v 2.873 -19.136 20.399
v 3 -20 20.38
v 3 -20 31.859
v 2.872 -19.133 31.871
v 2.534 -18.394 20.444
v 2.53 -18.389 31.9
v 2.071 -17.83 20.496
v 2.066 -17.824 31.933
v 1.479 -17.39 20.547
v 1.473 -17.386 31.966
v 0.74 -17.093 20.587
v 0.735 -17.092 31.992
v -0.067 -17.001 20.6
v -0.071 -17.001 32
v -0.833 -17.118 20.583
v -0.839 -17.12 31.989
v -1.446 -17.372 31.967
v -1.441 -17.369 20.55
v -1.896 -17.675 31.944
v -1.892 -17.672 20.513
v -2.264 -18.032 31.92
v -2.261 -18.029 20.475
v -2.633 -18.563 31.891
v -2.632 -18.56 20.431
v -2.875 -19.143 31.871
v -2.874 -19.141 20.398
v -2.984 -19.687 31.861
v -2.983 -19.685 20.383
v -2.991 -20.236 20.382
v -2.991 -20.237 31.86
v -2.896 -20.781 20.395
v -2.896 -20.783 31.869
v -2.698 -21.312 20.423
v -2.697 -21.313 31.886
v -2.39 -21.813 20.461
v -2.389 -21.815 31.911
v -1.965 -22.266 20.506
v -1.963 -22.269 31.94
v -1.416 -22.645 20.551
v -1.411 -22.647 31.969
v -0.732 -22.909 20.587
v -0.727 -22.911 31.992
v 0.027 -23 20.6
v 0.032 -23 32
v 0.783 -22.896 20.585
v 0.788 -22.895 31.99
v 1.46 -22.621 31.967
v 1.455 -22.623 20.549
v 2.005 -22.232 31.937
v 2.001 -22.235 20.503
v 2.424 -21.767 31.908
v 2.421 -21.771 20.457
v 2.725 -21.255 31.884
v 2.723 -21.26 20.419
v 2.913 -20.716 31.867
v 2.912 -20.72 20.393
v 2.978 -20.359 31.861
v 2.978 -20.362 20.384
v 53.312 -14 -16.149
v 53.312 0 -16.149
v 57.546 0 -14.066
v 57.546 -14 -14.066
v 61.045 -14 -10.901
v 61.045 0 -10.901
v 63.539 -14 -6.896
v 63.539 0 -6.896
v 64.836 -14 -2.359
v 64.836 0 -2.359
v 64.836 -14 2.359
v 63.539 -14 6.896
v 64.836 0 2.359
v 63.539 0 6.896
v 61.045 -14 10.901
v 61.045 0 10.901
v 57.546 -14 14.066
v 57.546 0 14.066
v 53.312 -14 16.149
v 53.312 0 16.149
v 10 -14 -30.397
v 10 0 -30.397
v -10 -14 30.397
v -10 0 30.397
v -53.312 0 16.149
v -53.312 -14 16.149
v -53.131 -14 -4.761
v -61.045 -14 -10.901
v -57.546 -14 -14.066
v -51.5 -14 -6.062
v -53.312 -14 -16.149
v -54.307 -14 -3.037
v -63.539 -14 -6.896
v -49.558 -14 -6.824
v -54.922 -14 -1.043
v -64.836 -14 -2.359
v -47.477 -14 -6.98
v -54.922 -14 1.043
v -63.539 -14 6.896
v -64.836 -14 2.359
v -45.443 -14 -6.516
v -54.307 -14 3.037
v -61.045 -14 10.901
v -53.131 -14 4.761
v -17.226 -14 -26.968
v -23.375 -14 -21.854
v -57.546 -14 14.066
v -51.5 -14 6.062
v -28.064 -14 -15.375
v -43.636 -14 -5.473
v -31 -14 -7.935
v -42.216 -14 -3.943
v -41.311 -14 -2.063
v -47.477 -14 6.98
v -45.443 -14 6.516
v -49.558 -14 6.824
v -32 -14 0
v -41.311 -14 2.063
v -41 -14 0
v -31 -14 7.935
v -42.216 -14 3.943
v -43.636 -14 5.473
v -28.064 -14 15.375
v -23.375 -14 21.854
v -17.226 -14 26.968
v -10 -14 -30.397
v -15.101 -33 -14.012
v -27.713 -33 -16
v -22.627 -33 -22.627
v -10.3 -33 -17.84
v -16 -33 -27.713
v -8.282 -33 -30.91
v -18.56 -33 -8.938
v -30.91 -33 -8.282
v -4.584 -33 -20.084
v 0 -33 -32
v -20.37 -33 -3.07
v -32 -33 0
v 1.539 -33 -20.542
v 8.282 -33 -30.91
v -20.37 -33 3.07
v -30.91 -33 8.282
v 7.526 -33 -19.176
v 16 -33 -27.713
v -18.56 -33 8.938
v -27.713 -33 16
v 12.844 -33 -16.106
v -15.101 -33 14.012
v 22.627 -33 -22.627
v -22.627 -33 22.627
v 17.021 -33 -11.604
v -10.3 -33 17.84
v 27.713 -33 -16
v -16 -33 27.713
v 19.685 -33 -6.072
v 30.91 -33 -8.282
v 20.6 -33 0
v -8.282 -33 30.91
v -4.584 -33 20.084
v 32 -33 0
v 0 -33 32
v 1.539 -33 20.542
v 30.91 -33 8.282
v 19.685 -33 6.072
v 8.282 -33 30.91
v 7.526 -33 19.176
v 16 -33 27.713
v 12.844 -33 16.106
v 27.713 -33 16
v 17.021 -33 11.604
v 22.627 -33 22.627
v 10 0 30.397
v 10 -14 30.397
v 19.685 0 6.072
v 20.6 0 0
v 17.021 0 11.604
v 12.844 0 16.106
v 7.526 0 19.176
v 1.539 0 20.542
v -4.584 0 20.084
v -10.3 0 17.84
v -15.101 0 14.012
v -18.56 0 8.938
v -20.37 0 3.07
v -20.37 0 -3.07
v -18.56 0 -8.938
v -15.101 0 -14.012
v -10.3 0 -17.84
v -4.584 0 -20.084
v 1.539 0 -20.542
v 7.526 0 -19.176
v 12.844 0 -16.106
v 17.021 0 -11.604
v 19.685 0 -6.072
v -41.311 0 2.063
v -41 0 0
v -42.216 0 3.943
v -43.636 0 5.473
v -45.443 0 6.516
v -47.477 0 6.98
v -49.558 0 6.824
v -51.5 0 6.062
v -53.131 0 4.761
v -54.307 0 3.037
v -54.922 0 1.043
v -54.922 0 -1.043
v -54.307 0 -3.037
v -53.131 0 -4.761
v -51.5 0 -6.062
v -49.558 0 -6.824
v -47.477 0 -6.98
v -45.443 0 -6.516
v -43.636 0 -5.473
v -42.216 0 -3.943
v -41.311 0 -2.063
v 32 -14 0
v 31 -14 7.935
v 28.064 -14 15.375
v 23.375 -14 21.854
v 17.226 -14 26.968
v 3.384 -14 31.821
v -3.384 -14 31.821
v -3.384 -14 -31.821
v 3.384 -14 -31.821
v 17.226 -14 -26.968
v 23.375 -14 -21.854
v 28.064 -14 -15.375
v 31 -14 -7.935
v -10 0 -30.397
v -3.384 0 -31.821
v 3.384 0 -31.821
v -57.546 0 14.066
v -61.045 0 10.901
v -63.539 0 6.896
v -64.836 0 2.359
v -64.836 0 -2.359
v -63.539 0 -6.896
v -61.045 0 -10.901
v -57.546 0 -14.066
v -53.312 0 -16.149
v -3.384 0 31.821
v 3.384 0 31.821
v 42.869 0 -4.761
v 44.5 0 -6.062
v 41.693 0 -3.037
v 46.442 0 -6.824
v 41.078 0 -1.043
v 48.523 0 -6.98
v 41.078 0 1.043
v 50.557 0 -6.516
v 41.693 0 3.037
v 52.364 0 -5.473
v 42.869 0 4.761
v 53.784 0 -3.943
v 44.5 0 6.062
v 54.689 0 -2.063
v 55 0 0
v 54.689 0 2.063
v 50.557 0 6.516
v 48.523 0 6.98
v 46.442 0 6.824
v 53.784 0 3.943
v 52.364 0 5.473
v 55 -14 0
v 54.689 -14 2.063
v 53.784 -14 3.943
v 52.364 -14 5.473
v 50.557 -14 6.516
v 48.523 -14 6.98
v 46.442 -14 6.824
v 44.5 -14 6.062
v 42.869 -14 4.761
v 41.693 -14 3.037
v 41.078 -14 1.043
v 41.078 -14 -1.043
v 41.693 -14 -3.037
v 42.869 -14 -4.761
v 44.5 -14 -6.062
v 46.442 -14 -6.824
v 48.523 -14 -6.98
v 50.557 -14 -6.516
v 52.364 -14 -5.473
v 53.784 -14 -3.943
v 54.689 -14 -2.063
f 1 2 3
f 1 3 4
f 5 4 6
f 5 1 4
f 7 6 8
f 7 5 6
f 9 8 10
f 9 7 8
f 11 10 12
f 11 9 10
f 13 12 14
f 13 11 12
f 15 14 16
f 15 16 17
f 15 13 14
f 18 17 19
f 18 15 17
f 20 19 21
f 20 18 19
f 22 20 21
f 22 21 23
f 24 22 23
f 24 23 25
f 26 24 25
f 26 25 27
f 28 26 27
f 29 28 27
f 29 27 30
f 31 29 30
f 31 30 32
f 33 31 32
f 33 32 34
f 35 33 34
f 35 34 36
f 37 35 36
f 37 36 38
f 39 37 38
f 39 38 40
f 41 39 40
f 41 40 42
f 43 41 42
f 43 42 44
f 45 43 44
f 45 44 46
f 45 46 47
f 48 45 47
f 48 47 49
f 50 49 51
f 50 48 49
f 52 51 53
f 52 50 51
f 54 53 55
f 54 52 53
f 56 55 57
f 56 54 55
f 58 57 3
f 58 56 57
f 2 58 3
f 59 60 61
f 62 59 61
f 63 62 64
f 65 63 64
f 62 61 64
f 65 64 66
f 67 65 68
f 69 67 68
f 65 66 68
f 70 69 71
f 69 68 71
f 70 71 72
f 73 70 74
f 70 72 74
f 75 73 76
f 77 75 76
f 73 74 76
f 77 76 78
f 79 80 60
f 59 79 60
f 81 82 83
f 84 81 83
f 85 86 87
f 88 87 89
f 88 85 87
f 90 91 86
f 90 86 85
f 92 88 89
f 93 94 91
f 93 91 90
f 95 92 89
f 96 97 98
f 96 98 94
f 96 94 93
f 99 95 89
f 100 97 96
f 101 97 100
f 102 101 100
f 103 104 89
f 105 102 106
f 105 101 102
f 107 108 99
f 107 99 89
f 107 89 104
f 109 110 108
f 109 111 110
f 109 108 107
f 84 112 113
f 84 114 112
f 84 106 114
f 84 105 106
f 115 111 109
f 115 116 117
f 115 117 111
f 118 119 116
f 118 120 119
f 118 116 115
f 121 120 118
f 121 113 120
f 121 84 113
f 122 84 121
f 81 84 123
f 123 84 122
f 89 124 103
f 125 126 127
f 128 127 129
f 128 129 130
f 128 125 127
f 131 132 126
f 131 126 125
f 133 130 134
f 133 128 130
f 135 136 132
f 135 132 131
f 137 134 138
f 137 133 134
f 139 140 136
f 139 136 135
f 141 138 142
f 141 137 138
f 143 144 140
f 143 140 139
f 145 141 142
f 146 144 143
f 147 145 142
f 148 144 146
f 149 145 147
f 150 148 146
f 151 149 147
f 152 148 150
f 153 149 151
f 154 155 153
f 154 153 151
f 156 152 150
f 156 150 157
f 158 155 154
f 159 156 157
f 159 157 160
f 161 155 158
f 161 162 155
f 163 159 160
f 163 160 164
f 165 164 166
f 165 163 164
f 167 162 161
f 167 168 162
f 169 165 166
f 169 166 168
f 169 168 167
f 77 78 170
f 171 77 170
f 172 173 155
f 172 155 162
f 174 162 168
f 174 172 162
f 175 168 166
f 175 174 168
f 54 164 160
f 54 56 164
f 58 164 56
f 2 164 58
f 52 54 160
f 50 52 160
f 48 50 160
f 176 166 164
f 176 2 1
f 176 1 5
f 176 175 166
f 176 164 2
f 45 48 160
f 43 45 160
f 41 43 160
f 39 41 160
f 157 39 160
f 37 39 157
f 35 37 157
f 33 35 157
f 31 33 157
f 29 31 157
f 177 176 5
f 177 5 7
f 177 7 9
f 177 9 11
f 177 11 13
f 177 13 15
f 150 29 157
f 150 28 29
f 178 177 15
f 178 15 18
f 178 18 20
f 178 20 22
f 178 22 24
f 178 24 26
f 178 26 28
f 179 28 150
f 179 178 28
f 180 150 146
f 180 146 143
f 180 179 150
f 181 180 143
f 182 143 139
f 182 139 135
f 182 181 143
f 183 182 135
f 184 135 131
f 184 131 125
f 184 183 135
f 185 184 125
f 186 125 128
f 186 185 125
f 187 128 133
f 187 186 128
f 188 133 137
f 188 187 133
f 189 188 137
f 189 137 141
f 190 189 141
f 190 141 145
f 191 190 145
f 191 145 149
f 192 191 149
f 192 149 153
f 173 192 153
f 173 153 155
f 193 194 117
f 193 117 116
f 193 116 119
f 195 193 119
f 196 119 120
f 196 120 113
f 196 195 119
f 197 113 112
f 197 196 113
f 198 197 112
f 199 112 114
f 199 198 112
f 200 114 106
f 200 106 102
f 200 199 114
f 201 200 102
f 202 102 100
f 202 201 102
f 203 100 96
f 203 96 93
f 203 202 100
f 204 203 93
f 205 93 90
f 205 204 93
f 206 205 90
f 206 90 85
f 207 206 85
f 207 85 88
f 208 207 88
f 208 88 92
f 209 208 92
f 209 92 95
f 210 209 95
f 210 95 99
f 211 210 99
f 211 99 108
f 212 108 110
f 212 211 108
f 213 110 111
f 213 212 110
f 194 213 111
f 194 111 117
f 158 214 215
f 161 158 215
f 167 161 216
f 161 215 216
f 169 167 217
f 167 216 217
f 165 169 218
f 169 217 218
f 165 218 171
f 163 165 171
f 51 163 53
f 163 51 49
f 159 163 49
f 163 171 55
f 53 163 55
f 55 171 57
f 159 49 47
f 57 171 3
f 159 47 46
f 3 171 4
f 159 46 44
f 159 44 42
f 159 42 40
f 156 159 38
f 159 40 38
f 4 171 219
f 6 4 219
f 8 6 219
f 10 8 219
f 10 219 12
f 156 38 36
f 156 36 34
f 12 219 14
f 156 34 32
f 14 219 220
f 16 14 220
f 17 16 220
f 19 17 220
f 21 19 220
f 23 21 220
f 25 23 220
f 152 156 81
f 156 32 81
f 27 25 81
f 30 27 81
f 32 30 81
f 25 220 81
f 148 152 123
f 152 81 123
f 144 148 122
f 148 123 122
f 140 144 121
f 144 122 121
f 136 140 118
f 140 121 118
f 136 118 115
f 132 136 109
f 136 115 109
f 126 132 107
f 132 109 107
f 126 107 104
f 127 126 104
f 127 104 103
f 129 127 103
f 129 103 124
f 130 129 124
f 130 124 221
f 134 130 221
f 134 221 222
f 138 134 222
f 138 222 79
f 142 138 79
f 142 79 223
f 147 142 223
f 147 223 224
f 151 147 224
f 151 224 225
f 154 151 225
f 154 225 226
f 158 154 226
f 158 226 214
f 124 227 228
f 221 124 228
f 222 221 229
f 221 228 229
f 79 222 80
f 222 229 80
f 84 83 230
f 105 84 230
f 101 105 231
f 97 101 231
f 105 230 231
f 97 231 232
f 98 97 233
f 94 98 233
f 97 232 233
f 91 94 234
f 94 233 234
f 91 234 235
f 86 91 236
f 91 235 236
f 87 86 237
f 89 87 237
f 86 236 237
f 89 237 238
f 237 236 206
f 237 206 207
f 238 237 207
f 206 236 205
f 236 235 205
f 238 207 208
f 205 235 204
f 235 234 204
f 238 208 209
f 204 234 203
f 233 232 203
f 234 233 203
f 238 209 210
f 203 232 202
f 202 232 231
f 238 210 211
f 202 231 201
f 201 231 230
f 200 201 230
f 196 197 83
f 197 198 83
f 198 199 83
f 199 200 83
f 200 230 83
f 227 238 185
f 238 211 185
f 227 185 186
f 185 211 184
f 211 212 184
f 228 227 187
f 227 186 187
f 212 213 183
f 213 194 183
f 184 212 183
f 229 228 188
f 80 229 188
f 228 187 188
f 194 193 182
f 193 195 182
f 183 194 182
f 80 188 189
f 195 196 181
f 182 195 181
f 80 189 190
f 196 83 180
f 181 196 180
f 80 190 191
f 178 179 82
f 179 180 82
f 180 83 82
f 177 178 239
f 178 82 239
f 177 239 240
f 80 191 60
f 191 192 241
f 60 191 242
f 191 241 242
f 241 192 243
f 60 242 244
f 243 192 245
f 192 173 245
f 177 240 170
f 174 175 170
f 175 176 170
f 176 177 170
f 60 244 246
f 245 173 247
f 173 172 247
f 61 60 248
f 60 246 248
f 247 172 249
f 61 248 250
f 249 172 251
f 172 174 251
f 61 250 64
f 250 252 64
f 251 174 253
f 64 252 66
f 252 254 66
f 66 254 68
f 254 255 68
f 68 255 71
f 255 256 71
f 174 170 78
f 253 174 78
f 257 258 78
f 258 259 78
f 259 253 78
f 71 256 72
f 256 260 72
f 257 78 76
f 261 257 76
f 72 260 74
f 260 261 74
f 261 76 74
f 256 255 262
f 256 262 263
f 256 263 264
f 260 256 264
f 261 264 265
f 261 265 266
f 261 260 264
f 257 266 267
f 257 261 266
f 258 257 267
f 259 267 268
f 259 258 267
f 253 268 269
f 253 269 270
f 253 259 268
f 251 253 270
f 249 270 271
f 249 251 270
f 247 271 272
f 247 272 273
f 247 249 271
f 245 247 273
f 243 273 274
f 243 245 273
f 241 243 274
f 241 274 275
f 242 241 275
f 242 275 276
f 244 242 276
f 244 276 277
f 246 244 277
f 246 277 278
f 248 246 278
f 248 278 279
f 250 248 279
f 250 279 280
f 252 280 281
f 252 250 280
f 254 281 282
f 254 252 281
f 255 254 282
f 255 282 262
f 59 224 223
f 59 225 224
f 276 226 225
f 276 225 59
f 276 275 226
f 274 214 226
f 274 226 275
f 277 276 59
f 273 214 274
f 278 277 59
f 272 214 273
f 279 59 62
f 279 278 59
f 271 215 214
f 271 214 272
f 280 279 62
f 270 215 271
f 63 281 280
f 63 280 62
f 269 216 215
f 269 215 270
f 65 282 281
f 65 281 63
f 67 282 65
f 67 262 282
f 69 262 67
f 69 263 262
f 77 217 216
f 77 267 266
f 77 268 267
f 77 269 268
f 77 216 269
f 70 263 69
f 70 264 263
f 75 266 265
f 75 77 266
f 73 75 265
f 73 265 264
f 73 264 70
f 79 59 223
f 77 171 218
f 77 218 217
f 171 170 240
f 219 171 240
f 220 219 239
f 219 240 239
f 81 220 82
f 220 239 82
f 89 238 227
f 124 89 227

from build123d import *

# Parameters (mm, degrees)
F0_R     = 7
F0_R_2   = 20.6
F1_DEPTH = 14
F2_R     = 32
F2_R_2   = 20.6
F3_DEPTH = 19
F4_R     = 3
F5_DEPTH = 32.001


with BuildPart() as f1:
    # F0 (on Front) → F1 (new body)
    with BuildSketch(Plane.XZ):
        with BuildLine():
            Line((-53.3125, -16.148602), (-10, -30.397368))
            ThreePointArc((-10, -30.397368), (0, -32), (10, -30.397368))
            Line((10, -30.397368), (53.3125, -16.148602))
            ThreePointArc((53.3125, -16.148602), (65, 0), (53.3125, 16.148602))
            Line((53.3125, 16.148602), (10, 30.397368))
            ThreePointArc((10, 30.397368), (0, 32), (-10, 30.397368))
            Line((-10, 30.397368), (-53.3125, 16.148602))
            ThreePointArc((-53.3125, 16.148602), (-65, 0), (-53.3125, -16.148602))
        make_face()
        with Locations((-48, 0)):
            Circle(F0_R, mode=Mode.SUBTRACT)
        Circle(F0_R_2, mode=Mode.SUBTRACT)
        with Locations((48, 0)):
            Circle(F0_R, mode=Mode.SUBTRACT)
    extrude(amount=F1_DEPTH)

    # F2 (on face) → F3 (join)
    with BuildSketch(Plane.XZ.offset(14)):
        Circle(F2_R)
        Circle(F2_R_2, mode=Mode.SUBTRACT)
    extrude(amount=F3_DEPTH)

    # F4 (on Top) → F5 (cut, through all)
    with BuildSketch(Plane.XY):
        with Locations((0, -20)):
            Circle(F4_R)
    extrude(amount=F5_DEPTH, mode=Mode.SUBTRACT)


solid = f1.part
